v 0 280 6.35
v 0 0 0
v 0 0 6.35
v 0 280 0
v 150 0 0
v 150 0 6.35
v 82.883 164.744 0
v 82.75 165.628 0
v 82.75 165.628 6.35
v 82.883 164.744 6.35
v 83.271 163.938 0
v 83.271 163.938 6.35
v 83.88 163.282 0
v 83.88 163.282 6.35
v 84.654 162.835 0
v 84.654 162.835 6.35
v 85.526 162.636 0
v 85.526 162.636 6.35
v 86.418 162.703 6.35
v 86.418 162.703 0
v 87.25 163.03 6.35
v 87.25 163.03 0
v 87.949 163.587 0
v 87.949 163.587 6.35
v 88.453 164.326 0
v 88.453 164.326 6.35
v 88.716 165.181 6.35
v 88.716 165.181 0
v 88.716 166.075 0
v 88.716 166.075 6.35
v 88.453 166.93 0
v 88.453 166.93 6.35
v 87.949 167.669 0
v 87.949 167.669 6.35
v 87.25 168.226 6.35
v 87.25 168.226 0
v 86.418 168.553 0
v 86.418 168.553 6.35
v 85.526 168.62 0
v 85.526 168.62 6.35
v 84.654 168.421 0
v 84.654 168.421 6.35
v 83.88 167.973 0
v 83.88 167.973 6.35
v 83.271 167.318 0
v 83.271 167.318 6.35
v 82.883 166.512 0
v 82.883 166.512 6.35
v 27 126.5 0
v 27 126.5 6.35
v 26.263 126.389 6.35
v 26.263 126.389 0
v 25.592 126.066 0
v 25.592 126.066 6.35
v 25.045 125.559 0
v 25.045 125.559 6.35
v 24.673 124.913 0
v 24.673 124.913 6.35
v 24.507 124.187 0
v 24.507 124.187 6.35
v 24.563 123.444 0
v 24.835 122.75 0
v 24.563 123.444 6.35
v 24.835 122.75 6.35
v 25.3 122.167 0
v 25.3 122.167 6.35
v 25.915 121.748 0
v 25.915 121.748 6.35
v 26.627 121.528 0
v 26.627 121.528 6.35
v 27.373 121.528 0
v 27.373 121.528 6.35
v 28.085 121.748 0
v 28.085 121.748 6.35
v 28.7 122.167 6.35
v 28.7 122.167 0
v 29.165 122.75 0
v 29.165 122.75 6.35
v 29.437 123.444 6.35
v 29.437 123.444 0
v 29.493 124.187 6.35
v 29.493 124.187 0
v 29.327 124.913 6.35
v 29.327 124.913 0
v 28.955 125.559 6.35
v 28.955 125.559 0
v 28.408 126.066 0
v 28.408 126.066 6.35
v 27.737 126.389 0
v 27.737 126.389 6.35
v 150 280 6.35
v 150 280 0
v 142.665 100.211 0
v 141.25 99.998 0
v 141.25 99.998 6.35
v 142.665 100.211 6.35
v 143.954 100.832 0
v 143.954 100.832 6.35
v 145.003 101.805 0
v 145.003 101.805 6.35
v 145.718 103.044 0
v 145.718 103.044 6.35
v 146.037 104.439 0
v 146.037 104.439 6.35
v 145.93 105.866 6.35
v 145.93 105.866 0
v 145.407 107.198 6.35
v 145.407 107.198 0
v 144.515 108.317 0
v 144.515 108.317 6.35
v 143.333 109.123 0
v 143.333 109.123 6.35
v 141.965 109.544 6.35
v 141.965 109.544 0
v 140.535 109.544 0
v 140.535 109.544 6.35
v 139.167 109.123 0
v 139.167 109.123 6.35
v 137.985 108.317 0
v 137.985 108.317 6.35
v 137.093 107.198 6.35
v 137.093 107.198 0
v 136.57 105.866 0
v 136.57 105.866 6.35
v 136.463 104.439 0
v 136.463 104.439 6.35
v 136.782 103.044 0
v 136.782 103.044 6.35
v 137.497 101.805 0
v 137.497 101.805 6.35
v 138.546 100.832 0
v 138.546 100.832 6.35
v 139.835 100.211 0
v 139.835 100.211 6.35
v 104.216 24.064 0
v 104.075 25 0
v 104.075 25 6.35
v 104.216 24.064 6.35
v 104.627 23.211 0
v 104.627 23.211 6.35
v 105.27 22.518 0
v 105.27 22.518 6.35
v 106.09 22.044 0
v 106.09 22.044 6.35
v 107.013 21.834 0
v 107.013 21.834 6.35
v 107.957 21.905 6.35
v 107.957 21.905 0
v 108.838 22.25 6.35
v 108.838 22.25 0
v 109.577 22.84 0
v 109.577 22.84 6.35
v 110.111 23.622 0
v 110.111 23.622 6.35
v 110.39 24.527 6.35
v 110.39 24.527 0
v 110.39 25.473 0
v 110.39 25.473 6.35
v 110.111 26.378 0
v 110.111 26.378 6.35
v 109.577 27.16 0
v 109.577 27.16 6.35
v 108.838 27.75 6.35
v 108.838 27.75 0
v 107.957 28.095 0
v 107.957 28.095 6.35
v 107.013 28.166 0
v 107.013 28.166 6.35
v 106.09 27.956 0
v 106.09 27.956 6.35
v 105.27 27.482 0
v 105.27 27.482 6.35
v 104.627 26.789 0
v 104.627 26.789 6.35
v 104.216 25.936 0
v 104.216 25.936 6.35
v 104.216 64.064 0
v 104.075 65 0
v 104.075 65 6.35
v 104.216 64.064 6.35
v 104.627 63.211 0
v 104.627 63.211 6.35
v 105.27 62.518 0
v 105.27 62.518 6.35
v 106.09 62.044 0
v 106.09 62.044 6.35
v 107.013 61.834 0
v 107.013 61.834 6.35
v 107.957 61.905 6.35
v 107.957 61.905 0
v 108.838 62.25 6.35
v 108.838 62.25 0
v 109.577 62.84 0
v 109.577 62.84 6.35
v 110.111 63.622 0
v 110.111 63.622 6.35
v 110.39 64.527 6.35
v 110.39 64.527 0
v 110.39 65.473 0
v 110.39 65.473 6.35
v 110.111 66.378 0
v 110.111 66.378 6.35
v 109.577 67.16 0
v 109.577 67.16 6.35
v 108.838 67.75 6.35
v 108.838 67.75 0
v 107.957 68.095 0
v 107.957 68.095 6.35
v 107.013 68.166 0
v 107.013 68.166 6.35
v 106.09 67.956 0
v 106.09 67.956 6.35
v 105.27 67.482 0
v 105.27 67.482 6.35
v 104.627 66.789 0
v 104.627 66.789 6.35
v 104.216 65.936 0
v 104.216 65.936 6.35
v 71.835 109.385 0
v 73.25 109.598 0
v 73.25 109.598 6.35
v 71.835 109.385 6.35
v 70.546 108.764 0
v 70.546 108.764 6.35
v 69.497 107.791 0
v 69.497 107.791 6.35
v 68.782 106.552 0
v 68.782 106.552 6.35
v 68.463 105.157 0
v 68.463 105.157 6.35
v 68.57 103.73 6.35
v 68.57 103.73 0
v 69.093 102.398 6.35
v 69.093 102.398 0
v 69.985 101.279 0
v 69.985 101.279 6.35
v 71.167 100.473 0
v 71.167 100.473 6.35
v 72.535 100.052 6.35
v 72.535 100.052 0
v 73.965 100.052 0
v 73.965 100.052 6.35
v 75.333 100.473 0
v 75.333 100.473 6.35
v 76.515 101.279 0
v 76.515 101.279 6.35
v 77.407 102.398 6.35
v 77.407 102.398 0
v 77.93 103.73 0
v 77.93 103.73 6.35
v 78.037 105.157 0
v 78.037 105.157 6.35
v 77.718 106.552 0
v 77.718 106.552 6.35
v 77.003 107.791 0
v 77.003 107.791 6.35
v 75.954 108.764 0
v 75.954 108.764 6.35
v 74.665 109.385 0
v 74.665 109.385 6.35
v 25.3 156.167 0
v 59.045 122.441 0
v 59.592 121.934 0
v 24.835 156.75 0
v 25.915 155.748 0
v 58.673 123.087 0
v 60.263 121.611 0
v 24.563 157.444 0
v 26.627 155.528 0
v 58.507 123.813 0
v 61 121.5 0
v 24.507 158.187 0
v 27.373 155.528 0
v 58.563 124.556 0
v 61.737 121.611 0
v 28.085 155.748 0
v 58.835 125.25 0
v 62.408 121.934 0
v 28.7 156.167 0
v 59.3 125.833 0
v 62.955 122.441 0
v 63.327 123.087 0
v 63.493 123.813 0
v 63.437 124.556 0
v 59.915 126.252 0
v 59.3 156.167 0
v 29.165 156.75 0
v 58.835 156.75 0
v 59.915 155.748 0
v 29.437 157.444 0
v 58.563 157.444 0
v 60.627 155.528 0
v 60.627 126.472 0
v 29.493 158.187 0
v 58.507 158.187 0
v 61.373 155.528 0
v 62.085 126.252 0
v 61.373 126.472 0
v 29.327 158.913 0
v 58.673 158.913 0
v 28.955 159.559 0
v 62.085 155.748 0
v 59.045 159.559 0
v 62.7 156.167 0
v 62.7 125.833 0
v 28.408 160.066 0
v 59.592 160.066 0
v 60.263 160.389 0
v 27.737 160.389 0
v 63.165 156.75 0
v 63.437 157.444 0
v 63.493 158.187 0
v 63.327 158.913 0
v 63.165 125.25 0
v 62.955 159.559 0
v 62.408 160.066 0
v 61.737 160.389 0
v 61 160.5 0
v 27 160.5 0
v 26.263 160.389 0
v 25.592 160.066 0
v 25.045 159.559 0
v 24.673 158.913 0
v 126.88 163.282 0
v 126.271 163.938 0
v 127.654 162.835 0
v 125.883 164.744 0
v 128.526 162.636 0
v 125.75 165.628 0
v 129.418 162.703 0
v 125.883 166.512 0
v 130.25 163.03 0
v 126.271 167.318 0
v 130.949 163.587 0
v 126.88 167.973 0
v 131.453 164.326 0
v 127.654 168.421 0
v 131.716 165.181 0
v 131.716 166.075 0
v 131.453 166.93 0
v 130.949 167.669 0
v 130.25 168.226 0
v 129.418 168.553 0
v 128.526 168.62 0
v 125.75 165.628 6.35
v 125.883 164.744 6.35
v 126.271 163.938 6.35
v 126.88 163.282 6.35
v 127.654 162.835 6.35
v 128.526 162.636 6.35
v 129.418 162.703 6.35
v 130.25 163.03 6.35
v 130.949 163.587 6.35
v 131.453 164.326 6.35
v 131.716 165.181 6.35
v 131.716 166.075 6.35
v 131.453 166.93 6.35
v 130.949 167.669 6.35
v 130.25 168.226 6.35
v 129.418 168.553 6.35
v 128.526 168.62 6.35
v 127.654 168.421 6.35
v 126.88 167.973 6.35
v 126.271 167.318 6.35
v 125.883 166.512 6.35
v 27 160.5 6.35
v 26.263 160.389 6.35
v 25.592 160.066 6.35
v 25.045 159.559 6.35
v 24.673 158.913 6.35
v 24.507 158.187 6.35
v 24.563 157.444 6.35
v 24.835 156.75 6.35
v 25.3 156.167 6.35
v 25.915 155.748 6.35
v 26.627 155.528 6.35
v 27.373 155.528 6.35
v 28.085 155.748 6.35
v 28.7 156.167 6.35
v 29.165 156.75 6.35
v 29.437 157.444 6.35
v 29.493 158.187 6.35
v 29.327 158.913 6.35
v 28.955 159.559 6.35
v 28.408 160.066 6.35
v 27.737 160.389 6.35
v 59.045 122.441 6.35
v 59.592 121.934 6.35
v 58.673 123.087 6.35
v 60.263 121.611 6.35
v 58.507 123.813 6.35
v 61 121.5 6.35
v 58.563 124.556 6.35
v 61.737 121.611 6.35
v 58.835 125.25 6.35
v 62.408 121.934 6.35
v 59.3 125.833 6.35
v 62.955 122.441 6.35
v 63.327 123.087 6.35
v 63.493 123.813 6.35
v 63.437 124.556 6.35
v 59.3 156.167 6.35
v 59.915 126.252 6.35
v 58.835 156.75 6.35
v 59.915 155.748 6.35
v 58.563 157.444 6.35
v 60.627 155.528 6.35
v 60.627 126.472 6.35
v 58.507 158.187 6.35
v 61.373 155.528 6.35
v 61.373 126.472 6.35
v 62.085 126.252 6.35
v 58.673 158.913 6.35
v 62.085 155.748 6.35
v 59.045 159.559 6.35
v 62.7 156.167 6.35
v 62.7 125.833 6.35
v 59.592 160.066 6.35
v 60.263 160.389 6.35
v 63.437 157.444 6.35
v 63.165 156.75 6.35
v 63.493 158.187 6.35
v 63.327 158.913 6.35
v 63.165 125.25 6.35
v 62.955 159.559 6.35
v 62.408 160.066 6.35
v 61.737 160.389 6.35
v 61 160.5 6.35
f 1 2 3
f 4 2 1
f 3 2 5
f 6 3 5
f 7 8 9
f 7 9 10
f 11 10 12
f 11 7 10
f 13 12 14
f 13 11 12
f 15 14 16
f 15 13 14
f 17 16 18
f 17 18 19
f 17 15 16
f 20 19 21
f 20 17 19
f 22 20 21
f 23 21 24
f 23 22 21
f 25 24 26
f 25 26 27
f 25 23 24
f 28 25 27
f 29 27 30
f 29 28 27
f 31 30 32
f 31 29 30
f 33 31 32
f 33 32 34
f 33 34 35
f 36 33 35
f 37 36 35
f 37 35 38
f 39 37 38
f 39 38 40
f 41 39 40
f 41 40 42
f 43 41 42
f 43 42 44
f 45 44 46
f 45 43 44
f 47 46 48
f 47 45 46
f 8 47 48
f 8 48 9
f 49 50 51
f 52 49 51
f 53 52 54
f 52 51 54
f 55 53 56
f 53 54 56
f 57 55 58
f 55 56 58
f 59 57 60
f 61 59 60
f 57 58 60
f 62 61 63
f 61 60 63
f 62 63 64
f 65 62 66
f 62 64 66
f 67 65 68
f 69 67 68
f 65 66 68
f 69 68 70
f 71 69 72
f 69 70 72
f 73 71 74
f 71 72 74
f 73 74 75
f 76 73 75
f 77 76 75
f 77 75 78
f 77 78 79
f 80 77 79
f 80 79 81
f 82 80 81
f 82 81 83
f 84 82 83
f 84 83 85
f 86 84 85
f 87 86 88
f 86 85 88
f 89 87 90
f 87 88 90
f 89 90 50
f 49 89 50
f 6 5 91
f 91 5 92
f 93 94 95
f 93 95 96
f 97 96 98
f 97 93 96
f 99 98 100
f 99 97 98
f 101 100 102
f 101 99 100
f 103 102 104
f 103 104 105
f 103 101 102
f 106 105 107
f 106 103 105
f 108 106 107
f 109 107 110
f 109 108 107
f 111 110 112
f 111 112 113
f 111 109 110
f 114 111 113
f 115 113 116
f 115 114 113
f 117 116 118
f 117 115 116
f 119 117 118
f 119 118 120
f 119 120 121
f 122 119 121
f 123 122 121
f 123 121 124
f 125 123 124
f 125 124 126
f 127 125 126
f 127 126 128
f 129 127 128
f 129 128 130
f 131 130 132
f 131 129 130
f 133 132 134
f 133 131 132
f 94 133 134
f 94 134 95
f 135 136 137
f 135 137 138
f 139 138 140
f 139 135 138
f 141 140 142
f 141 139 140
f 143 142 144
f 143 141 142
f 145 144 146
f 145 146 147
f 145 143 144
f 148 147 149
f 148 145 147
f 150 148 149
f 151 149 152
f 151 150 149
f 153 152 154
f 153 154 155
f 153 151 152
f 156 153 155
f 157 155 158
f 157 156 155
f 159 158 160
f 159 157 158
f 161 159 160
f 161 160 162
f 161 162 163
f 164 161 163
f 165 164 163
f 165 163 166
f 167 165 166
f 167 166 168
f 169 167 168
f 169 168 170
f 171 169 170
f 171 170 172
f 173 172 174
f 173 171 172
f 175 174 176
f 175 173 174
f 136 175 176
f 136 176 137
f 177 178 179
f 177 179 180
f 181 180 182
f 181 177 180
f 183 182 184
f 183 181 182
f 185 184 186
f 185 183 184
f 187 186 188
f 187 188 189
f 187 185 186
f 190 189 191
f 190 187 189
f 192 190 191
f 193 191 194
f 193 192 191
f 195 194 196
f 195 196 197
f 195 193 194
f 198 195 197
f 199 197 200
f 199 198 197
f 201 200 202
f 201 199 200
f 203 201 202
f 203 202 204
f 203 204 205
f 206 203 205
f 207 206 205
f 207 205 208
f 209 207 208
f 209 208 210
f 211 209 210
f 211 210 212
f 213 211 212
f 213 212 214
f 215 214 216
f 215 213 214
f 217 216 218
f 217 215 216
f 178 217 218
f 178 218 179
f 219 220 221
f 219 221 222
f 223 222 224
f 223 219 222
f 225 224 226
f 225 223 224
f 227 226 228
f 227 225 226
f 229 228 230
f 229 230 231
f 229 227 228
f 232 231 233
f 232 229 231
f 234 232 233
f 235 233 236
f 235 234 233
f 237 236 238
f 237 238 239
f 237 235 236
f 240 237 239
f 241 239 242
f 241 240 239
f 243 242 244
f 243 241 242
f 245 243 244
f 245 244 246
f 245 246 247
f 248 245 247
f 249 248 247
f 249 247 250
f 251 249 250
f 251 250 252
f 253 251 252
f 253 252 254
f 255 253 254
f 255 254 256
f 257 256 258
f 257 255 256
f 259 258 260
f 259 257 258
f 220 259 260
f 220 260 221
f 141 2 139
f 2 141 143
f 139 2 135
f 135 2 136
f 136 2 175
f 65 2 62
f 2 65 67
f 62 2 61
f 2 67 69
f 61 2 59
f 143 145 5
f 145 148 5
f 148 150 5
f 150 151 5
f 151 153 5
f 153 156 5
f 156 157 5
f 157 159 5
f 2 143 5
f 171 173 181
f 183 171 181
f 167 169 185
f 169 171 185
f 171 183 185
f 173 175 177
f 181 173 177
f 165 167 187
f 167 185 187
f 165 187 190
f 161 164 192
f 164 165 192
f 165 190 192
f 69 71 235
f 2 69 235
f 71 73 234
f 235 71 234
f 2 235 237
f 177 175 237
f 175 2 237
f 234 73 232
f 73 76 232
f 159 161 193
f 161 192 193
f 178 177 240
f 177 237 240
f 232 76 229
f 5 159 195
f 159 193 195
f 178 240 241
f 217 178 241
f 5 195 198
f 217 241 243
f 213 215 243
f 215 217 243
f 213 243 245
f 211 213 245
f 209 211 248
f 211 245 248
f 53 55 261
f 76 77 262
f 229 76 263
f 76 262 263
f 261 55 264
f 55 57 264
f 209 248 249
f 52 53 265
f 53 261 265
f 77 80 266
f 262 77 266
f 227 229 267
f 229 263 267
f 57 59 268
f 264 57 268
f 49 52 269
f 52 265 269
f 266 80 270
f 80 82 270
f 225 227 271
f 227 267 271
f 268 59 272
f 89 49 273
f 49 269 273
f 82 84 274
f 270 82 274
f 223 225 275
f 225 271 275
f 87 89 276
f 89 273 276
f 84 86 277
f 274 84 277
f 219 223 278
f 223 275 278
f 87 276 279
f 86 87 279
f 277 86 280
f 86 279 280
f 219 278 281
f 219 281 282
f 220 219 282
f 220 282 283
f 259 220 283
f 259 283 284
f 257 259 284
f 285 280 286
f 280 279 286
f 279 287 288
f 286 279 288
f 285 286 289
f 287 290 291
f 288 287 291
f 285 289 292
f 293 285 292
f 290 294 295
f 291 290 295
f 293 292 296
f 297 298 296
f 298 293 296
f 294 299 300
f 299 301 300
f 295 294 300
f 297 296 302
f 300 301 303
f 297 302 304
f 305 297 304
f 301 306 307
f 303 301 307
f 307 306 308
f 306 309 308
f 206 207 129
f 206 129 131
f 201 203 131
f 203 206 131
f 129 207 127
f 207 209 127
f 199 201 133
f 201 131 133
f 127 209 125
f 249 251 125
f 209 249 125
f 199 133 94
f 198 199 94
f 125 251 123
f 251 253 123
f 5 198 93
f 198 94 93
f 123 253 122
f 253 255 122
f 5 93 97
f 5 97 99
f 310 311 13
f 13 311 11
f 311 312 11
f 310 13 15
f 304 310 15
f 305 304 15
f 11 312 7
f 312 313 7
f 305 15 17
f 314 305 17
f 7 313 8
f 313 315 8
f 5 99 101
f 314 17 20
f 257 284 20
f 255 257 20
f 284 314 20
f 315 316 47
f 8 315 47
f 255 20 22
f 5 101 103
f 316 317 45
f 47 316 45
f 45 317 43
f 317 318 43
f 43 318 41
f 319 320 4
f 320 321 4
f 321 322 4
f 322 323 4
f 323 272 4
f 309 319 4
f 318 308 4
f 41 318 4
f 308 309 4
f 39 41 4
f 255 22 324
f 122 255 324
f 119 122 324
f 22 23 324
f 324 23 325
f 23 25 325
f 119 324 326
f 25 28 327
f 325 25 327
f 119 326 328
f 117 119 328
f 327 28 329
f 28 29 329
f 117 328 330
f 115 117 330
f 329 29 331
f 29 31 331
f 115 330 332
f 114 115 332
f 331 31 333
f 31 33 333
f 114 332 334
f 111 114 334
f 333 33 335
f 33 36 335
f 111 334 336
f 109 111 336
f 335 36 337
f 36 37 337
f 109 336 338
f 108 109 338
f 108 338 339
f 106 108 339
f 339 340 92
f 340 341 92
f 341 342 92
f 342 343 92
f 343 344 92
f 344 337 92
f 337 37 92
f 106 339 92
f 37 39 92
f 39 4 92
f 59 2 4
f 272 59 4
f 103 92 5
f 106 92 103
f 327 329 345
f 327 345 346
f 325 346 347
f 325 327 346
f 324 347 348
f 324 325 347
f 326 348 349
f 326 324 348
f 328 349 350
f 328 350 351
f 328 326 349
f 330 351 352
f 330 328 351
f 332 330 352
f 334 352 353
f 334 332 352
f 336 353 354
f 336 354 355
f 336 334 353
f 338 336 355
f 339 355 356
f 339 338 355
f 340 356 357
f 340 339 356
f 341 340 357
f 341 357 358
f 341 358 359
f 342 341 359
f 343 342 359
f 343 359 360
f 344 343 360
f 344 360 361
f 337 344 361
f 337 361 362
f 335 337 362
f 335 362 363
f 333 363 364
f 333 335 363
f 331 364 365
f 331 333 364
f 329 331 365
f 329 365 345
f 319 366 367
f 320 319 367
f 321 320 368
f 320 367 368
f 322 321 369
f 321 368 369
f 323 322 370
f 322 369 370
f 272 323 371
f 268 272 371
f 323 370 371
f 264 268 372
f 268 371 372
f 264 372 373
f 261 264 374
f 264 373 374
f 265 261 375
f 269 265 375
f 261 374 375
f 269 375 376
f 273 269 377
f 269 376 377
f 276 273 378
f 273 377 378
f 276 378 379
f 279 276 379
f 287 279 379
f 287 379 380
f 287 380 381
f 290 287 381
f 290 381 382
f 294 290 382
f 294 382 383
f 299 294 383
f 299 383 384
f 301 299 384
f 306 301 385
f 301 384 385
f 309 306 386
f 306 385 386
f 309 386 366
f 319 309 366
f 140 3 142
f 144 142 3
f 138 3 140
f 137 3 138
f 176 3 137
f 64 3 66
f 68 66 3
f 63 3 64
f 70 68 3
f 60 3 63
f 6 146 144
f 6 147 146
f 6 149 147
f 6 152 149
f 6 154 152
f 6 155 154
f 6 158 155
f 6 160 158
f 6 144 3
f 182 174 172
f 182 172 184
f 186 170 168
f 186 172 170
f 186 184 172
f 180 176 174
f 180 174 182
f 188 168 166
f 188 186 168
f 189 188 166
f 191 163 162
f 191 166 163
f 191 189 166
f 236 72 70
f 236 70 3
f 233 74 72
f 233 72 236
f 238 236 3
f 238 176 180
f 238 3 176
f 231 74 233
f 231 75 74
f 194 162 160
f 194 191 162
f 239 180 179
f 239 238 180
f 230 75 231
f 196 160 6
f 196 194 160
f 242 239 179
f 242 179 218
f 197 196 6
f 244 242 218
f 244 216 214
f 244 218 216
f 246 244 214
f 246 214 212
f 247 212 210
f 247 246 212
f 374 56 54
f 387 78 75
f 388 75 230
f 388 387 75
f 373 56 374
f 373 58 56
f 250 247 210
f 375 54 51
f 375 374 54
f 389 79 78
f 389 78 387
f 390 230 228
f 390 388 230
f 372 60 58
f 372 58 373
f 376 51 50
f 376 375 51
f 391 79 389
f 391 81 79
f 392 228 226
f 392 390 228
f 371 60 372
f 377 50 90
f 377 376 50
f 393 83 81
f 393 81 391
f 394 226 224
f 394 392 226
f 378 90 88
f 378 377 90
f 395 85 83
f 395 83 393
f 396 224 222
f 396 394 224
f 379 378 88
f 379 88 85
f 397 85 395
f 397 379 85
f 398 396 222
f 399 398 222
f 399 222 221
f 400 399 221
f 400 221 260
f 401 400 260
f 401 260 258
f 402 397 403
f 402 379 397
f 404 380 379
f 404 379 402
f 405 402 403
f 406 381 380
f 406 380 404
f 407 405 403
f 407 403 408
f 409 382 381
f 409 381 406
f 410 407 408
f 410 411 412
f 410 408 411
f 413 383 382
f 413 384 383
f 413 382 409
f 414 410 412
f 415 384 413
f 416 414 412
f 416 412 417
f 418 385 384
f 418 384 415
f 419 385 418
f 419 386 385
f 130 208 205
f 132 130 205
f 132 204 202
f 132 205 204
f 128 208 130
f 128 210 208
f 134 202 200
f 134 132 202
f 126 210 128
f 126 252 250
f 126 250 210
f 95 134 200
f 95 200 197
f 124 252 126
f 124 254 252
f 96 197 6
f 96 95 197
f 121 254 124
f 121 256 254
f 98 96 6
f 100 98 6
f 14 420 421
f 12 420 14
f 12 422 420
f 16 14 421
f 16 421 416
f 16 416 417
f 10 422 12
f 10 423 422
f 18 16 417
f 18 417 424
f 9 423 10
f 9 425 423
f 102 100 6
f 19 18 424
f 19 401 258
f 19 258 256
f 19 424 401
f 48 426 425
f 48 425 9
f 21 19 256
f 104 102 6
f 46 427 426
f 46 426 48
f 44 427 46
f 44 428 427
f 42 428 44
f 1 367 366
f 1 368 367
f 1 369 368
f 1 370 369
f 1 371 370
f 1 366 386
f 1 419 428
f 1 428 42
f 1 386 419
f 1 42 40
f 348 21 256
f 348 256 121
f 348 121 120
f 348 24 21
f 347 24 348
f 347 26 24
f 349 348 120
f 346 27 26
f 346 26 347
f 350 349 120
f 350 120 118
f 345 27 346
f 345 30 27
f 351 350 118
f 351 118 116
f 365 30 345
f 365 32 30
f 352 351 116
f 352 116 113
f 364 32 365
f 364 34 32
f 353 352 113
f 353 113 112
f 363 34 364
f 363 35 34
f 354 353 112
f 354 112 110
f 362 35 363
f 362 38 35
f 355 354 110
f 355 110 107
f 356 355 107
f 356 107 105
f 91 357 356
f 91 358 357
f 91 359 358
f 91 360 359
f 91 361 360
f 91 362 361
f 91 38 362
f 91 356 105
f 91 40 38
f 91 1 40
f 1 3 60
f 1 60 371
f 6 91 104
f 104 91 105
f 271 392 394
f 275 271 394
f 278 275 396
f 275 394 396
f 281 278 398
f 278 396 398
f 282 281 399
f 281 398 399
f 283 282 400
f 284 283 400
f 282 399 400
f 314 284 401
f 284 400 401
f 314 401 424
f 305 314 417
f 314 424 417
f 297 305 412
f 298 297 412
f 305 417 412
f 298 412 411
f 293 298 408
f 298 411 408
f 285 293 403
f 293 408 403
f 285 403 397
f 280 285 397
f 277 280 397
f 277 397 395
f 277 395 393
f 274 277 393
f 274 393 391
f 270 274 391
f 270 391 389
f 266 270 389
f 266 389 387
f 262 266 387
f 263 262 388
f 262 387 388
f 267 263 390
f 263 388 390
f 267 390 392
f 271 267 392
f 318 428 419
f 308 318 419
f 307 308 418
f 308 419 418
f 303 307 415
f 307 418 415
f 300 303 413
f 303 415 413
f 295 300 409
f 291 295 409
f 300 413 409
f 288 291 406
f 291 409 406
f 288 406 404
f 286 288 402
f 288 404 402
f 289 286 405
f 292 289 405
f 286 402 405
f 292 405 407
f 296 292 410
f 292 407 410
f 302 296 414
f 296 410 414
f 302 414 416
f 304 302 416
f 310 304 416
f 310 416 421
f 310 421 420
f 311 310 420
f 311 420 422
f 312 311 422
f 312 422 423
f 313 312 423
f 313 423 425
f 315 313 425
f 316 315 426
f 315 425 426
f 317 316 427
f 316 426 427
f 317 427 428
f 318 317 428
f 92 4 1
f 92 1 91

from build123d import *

# Parameters (mm, degrees)
SKETCH1_W           = 150
SKETCH1_H           = 280
BOSS_EXTRUDE1_DEPTH = 6.35
SKETCH4_R           = 3.175
SKETCH4_R_2         = 3
CUT_EXTRUDE1_DEPTH  = 6.35
CUT_EXTRUDE2_DEPTH  = 6.35


with BuildPart() as part:
    # Sketch1 → Boss-Extrude1 (new body)
    with BuildSketch(Plane.XY):
        with Locations((75, 140)):
            Rectangle(SKETCH1_W, SKETCH1_H)
    extrude(amount=BOSS_EXTRUDE1_DEPTH)

    # Sketch4 → Cut-Extrude1 (cut)
    with BuildSketch(Plane.XY):
        with Locations(Location((107.25, 25, 0), (0, 0, 180))):
            Circle(SKETCH4_R)
        with BuildLine():
            ThreePointArc((141.25, 109.597983852), (136.45, 104.797983852), (141.25, 99.997983852))
            ThreePointArc((141.25, 99.997983852), (146.05, 104.797983852), (141.25, 109.597983852))
        make_face()
        with BuildLine():
            ThreePointArc((73.25, 99.997983852), (78.05, 104.797983852), (73.25, 109.597983852))
            ThreePointArc((73.25, 109.597983852), (68.45, 104.797983852), (73.25, 99.997983852))
        make_face()
        with Locations(Location((128.750000003, 165.627983852, 0), (0, 0, 180))):
            Circle(SKETCH4_R_2)
        with Locations(Location((85.750000003, 165.627983852, 0), (0, 0, 180))):
            Circle(SKETCH4_R_2)
        with Locations(Location((107.25, 65, 0), (0, 0, 180))):
            Circle(SKETCH4_R)
    extrude(amount=CUT_EXTRUDE1_DEPTH, mode=Mode.SUBTRACT)

    # Sketch5 → Cut-Extrude2 (cut)
    with BuildSketch(Plane(origin=(0, 0, 6.35), x_dir=(-1, 0, 0), z_dir=(0, 0, 1))):
        with BuildLine():
            ThreePointArc((-61, -155.5), (-63.5, -158), (-61, -160.5))
            ThreePointArc((-61, -160.5), (-58.5, -158), (-61, -155.5))
        make_face()
        with BuildLine():
            ThreePointArc((-27, -155.5), (-29.5, -158), (-27, -160.5))
            ThreePointArc((-27, -160.5), (-24.5, -158), (-27, -155.5))
        make_face()
        with BuildLine():
            ThreePointArc((-27, -121.5), (-29.5, -124), (-27, -126.5))
            ThreePointArc((-27, -126.5), (-24.5, -124), (-27, -121.5))
        make_face()
        with BuildLine():
            ThreePointArc((-61, -126.5), (-58.5, -124), (-61, -121.5))
            ThreePointArc((-61, -121.5), (-63.5, -124), (-61, -126.5))
        make_face()
    extrude(amount=-CUT_EXTRUDE2_DEPTH, mode=Mode.SUBTRACT)


solid = part.part
